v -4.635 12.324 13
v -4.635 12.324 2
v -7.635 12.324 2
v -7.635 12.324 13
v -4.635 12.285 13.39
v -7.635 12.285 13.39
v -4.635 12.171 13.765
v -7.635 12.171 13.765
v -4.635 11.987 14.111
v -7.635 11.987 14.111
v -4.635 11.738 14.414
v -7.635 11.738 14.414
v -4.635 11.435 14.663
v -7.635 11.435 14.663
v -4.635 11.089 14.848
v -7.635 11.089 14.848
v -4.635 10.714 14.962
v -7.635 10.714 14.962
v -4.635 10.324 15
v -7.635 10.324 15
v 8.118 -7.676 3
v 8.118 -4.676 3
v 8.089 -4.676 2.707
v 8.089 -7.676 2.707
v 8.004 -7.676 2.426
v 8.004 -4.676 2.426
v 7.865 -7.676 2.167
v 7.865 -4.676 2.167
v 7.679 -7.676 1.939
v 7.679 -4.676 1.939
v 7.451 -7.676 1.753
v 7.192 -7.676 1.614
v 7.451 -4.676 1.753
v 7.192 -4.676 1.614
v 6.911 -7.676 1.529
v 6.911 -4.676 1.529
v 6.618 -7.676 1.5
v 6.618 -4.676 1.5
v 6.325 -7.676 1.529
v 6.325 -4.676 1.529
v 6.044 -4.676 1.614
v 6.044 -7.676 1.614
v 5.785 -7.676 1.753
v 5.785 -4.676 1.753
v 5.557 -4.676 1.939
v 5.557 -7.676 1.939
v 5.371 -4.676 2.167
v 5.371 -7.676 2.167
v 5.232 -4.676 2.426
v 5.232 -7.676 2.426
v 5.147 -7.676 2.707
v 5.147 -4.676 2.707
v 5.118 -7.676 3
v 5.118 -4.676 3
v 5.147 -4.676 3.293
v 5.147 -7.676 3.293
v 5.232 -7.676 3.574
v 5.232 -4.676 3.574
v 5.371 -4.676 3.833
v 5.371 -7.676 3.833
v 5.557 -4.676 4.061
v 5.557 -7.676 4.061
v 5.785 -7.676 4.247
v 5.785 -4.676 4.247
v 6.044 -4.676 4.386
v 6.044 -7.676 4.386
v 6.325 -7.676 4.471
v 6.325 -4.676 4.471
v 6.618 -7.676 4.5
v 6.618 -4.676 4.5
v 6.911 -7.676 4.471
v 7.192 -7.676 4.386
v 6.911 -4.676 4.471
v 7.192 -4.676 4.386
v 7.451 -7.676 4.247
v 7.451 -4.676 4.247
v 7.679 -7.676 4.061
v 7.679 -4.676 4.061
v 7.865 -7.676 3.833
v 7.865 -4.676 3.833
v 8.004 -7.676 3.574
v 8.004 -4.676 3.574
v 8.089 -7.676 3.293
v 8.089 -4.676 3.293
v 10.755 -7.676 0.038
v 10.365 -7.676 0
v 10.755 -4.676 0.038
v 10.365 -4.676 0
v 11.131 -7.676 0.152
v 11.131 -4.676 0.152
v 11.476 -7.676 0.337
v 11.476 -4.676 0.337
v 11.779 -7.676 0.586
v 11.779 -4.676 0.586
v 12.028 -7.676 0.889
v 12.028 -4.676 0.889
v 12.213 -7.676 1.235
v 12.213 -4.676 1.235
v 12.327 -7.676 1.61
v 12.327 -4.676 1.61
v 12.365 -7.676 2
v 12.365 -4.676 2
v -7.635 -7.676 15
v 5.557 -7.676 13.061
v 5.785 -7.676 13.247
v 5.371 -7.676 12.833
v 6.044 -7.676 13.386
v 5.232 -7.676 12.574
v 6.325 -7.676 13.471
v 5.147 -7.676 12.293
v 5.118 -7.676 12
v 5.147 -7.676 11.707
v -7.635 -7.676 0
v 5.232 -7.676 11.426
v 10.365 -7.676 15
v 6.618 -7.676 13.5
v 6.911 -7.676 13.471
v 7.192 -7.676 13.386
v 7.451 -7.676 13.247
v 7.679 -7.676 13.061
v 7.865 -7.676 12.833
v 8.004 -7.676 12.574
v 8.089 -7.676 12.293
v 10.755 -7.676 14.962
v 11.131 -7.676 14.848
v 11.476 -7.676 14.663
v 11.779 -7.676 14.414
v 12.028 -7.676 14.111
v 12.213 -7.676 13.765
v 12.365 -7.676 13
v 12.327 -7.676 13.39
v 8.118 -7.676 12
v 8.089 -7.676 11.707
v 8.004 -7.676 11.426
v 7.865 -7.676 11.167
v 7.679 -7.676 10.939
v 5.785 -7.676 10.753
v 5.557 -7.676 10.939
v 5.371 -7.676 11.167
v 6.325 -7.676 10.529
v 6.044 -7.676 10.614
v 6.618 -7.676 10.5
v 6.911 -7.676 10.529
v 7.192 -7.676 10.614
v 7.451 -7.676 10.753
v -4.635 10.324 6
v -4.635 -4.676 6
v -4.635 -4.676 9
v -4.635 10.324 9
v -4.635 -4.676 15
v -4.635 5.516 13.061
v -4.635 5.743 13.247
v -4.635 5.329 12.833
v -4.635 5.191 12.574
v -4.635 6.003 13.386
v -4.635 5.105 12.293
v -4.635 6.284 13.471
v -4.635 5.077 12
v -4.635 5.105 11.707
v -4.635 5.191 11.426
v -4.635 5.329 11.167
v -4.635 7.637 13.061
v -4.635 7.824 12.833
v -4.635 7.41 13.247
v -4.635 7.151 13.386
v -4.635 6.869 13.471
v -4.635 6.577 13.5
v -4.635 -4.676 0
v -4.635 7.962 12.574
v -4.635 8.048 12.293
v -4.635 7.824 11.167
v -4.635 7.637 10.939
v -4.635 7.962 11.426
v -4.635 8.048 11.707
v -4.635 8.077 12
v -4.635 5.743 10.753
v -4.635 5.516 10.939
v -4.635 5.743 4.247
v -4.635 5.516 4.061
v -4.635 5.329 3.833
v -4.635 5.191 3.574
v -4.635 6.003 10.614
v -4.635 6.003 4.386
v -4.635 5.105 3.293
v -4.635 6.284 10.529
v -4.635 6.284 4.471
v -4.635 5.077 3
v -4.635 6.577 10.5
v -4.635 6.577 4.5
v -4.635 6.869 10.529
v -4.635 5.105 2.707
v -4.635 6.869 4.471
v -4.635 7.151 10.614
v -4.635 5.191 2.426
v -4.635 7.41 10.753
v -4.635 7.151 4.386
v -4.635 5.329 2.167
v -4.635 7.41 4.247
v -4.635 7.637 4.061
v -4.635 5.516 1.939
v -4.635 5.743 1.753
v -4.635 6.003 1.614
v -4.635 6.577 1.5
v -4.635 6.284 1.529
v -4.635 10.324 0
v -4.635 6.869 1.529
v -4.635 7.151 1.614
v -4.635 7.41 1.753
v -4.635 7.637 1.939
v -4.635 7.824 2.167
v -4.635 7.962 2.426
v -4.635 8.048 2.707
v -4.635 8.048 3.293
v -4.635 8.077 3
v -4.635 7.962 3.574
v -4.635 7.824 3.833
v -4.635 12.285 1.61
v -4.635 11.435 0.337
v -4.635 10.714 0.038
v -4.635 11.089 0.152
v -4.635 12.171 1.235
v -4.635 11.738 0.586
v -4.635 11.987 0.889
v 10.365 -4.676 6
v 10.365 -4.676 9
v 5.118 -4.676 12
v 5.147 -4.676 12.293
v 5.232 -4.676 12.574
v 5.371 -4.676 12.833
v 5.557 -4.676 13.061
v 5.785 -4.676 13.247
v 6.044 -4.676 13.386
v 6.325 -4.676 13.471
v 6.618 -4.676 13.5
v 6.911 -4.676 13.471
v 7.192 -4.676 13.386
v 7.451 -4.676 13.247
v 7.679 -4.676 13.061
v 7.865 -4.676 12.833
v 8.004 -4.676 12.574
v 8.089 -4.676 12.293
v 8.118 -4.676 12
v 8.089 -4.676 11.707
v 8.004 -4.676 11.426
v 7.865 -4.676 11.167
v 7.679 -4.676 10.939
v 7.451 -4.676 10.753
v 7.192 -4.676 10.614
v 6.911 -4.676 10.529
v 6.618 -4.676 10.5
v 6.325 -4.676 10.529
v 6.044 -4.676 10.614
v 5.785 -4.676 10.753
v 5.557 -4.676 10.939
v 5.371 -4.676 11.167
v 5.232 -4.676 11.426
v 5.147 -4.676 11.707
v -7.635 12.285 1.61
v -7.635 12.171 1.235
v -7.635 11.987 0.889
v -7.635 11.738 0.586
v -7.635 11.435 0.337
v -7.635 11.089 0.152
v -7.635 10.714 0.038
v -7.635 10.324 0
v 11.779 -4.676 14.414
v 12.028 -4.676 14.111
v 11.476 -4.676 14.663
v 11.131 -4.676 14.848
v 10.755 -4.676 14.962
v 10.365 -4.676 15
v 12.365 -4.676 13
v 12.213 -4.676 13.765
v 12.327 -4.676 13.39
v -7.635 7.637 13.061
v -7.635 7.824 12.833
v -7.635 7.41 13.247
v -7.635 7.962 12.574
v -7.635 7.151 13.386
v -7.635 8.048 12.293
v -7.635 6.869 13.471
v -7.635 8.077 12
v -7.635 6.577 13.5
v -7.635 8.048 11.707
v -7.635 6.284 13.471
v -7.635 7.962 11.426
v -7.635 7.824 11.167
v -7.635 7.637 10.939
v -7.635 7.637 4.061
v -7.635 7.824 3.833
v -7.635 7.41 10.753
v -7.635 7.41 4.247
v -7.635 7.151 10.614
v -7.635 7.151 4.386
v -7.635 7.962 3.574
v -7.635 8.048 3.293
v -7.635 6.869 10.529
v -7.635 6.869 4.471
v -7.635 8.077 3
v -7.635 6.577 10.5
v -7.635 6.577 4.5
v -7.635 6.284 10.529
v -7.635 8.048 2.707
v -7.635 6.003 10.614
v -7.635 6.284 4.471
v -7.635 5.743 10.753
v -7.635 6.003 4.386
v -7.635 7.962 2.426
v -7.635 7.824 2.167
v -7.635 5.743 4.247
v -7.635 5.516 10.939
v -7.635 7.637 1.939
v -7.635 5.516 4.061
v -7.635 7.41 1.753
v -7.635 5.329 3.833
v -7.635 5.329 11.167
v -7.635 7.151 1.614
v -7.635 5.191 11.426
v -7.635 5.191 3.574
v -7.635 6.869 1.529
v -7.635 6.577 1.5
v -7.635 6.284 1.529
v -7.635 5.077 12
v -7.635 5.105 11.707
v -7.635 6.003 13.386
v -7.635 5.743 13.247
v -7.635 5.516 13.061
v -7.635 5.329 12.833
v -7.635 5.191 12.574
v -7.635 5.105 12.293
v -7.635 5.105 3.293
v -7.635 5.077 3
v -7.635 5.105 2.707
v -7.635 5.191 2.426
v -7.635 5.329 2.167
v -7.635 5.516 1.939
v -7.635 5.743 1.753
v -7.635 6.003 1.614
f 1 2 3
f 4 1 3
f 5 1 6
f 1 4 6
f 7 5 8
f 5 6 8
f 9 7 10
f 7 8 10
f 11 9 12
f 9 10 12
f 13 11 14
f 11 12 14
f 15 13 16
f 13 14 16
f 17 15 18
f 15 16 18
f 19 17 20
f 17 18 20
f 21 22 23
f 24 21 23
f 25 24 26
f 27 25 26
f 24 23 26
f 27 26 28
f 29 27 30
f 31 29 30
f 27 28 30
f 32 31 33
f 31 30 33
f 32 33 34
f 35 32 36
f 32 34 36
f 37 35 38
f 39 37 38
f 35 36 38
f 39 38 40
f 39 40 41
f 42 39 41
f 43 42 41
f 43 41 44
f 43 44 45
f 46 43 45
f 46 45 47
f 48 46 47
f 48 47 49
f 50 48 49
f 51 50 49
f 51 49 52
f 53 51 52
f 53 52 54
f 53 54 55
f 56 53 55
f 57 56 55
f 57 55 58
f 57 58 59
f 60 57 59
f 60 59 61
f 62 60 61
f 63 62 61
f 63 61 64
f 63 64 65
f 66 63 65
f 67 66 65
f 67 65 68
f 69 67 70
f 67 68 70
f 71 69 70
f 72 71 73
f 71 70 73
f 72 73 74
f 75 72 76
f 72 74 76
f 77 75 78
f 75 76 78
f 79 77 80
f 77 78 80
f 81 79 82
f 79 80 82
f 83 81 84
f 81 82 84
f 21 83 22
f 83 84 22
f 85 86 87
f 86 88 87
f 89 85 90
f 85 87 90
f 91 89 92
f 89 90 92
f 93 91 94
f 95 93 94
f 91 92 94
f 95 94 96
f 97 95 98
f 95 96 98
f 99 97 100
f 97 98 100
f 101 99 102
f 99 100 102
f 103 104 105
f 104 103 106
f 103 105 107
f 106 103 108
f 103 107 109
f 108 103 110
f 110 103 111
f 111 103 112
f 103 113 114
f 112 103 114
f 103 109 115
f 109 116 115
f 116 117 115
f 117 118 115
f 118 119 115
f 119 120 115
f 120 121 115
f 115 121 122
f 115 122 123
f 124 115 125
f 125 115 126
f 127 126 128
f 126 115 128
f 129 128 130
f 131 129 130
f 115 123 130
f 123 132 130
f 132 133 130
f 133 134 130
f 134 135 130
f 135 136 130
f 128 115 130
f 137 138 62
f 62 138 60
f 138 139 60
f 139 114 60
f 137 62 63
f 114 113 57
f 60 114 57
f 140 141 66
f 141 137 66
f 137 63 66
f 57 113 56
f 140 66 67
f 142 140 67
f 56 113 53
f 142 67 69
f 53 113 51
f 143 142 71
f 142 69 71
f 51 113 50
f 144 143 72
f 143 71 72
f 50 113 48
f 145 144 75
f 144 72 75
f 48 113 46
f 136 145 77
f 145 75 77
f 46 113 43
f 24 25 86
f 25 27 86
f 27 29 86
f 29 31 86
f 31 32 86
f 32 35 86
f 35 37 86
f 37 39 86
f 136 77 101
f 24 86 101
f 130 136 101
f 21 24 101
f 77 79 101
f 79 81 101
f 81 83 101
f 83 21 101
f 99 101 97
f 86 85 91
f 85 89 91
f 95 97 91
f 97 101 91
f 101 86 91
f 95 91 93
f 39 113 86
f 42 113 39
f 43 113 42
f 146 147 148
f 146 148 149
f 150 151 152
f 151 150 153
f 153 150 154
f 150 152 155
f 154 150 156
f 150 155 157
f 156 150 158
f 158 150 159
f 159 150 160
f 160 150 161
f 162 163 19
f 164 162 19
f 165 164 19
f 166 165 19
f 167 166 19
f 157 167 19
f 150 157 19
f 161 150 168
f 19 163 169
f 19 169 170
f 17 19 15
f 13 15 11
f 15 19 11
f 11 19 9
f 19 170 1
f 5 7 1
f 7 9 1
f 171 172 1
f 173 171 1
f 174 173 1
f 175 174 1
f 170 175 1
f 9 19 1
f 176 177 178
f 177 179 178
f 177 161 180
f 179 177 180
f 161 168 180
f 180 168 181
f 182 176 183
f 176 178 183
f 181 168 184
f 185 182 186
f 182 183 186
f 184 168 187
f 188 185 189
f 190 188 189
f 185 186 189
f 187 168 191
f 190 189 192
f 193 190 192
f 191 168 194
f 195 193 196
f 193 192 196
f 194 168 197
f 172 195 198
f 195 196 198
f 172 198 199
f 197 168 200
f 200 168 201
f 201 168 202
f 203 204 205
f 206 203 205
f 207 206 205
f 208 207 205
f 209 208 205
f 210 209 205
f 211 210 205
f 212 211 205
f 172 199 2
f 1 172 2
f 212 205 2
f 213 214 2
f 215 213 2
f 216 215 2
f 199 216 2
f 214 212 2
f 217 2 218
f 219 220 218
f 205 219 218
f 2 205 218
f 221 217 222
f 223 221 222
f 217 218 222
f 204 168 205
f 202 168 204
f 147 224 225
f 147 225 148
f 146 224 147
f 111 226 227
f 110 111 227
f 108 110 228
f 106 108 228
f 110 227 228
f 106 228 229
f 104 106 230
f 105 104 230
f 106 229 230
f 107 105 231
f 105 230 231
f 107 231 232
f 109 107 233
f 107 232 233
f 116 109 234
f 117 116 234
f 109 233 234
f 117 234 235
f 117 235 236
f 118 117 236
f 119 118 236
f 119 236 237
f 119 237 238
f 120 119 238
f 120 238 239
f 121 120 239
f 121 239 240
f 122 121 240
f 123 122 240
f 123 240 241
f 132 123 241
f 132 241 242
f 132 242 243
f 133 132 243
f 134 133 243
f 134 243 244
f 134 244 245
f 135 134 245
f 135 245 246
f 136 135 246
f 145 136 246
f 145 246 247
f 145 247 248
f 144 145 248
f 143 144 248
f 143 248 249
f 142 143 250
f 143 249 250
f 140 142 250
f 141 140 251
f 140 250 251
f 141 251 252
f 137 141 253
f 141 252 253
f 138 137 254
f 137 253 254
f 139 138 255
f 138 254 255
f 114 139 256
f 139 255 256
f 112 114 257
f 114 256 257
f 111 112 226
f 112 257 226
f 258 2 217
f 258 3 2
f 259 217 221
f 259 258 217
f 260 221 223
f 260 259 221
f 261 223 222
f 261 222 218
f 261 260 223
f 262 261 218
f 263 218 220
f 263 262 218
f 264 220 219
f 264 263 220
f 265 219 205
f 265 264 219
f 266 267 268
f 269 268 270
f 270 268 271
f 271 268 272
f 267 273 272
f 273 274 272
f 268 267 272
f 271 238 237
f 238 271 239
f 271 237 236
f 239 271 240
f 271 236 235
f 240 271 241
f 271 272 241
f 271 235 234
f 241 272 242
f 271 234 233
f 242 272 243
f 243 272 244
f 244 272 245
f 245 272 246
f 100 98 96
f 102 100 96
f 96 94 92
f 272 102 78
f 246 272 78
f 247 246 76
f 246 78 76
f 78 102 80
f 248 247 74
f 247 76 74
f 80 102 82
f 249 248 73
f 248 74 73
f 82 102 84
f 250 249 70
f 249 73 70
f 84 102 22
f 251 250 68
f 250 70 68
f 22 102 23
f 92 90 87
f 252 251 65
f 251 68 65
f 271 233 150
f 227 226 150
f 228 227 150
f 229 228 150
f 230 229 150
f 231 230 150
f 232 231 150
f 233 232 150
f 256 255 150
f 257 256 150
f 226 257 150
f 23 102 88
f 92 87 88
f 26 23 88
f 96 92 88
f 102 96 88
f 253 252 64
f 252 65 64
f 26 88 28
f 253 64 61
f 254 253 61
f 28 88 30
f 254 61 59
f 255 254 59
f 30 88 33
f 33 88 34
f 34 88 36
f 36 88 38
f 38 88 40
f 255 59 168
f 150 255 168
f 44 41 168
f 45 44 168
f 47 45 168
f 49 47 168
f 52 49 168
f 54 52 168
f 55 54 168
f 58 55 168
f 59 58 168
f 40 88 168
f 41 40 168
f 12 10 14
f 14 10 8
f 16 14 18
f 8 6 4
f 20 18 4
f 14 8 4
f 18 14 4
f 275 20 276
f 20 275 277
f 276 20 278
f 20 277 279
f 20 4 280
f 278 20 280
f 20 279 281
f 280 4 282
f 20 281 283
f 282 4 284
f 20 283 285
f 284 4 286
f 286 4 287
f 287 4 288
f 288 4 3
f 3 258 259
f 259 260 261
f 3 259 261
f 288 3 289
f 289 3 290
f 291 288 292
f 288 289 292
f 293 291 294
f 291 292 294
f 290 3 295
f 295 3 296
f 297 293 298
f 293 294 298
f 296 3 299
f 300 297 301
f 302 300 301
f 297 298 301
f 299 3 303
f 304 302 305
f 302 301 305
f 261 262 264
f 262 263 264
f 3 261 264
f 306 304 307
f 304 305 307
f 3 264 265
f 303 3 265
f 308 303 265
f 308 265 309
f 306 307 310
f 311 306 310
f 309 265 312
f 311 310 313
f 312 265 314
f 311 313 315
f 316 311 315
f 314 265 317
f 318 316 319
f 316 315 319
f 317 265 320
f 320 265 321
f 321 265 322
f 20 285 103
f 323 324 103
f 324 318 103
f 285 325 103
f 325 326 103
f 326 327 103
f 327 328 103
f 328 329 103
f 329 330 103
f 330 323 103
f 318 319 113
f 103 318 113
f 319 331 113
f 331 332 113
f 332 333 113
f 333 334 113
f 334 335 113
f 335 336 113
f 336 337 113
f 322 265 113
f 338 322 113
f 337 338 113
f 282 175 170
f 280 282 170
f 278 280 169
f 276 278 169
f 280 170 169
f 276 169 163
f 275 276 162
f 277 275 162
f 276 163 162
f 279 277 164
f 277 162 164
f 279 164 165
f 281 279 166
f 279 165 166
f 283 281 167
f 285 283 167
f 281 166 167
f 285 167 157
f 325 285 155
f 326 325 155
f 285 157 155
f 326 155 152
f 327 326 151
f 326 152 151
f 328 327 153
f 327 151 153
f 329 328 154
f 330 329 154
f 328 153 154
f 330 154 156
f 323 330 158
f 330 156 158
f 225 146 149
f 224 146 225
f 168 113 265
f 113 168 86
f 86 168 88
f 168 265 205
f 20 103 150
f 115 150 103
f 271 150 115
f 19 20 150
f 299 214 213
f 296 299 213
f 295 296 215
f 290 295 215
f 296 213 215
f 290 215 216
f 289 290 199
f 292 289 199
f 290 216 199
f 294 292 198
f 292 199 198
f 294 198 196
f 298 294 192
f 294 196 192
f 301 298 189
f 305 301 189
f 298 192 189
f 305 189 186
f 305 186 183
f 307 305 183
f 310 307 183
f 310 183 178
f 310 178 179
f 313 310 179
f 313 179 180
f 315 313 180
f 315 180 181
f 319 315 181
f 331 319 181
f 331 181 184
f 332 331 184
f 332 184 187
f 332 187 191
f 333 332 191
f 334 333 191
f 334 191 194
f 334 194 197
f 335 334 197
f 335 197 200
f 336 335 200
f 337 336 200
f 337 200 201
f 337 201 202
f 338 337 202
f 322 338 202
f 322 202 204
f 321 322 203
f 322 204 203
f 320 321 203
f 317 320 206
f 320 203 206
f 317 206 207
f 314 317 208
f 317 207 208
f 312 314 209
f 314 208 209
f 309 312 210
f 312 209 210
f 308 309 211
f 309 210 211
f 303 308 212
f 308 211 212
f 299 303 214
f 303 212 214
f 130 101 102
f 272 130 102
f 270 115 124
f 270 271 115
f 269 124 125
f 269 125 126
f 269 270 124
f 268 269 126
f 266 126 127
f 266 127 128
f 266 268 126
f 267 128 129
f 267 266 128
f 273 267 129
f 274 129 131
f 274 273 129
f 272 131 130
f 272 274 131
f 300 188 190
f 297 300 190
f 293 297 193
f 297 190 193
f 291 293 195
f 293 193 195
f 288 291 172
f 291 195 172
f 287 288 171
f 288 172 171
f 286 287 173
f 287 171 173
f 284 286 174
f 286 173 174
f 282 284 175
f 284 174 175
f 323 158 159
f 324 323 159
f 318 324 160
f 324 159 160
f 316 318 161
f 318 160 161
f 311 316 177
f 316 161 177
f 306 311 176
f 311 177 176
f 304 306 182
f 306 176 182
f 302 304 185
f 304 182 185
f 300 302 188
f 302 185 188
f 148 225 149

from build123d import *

# Parameters (mm, degrees)
BOSS_EXTRUDE1_DEPTH = 15
GUSSET1_THICKNESS   = 3
SKETCH3_R           = 1.5
CUT_EXTRUDE1_DEPTH  = 15
SKETCH4_R           = 1.5
CUT_EXTRUDE2_DEPTH  = 15
FILLET1_R           = 2


with BuildPart() as part:
    # Sketch1 → Boss-Extrude1 (new body)
    with BuildSketch(Plane.XY):
        Polygon((-7.634854772, 12.323651452), (-7.634854772, -7.676348548), (12.365145228, -7.676348548), (12.365145228, -4.676348548), (-4.634854772, -4.676348548), (-4.634854772, 12.323651452), align=None)
    extrude(amount=BOSS_EXTRUDE1_DEPTH)

    # Sketch3 → Cut-Extrude1 (cut)
    with BuildSketch(Plane(origin=(-4.634854772, 0, 0), x_dir=(0, 0, -1), z_dir=(1, 0, 0))):
        with BuildLine():
            ThreePointArc((-10.5, 6.576602629), (-10.939339828, 7.637262801), (-12, 8.076602629))
            Line((-12, 8.076602629), (-12, 5.076602629))
            ThreePointArc((-12, 5.076602629), (-10.939339828, 5.515942457), (-10.5, 6.576602629))
        make_face()
        with BuildLine():
            Line((-12, 5.076602629), (-12, 8.076602629))
            ThreePointArc((-12, 8.076602629), (-13.5, 6.576602629), (-12, 5.076602629))
        make_face()
        with Locations(Location((-3, 6.576602629, 0), (0, 0, 90))):
            Circle(SKETCH3_R)
    extrude(amount=-CUT_EXTRUDE1_DEPTH, mode=Mode.SUBTRACT)

    # Sketch4 → Cut-Extrude2 (cut)
    with BuildSketch(Plane(origin=(0, -4.676348548, 0), x_dir=(1, 0, 0), z_dir=(0, 1, 0))):
        with BuildLine():
            ThreePointArc((5.118096405, -3), (6.618096405, -4.5), (8.118096405, -3))
            Line((8.118096405, -3), (5.118096405, -3))
        make_face()
        with BuildLine():
            Line((5.118096405, -3), (8.118096405, -3))
            ThreePointArc((8.118096405, -3), (6.618096405, -1.5), (5.118096405, -3))
        make_face()
        with Locations(Location((6.618096405, -12, 0), (0, 0, 180))):
            Circle(SKETCH4_R)
    extrude(amount=-CUT_EXTRUDE2_DEPTH, mode=Mode.SUBTRACT)

    # Fillet1
    fillet1_edges = [part.edges().sort_by_distance(p)[0] for p in [
        (12.365145228, -6.176348548, 15),
        (-6.134854772, 12.323651452, 15),
        (12.365145228, -6.176348548, 0),
        (-6.134854772, 12.323651452, 0),
    ]]
    fillet(fillet1_edges, radius=FILLET1_R)


with BuildPart() as body_2:
    # Gusset1: a gusset: a plate 3.0 thick in the corner of two members, its outline drawn in place
    gusset1_outline = Wire([Line((-4.634854772, -4.676348548, 6), (-4.634854772, 10.323651452, 6)), Line((-4.634854772, 10.323651452, 6), (10.365145228, -4.676348548, 6)), Line((10.365145228, -4.676348548, 6), (-4.634854772, -4.676348548, 6))])
    add(extrude(Face(gusset1_outline), amount=GUSSET1_THICKNESS, dir=(0, 0, 1)))


solid = Compound([part.part, body_2.part])
